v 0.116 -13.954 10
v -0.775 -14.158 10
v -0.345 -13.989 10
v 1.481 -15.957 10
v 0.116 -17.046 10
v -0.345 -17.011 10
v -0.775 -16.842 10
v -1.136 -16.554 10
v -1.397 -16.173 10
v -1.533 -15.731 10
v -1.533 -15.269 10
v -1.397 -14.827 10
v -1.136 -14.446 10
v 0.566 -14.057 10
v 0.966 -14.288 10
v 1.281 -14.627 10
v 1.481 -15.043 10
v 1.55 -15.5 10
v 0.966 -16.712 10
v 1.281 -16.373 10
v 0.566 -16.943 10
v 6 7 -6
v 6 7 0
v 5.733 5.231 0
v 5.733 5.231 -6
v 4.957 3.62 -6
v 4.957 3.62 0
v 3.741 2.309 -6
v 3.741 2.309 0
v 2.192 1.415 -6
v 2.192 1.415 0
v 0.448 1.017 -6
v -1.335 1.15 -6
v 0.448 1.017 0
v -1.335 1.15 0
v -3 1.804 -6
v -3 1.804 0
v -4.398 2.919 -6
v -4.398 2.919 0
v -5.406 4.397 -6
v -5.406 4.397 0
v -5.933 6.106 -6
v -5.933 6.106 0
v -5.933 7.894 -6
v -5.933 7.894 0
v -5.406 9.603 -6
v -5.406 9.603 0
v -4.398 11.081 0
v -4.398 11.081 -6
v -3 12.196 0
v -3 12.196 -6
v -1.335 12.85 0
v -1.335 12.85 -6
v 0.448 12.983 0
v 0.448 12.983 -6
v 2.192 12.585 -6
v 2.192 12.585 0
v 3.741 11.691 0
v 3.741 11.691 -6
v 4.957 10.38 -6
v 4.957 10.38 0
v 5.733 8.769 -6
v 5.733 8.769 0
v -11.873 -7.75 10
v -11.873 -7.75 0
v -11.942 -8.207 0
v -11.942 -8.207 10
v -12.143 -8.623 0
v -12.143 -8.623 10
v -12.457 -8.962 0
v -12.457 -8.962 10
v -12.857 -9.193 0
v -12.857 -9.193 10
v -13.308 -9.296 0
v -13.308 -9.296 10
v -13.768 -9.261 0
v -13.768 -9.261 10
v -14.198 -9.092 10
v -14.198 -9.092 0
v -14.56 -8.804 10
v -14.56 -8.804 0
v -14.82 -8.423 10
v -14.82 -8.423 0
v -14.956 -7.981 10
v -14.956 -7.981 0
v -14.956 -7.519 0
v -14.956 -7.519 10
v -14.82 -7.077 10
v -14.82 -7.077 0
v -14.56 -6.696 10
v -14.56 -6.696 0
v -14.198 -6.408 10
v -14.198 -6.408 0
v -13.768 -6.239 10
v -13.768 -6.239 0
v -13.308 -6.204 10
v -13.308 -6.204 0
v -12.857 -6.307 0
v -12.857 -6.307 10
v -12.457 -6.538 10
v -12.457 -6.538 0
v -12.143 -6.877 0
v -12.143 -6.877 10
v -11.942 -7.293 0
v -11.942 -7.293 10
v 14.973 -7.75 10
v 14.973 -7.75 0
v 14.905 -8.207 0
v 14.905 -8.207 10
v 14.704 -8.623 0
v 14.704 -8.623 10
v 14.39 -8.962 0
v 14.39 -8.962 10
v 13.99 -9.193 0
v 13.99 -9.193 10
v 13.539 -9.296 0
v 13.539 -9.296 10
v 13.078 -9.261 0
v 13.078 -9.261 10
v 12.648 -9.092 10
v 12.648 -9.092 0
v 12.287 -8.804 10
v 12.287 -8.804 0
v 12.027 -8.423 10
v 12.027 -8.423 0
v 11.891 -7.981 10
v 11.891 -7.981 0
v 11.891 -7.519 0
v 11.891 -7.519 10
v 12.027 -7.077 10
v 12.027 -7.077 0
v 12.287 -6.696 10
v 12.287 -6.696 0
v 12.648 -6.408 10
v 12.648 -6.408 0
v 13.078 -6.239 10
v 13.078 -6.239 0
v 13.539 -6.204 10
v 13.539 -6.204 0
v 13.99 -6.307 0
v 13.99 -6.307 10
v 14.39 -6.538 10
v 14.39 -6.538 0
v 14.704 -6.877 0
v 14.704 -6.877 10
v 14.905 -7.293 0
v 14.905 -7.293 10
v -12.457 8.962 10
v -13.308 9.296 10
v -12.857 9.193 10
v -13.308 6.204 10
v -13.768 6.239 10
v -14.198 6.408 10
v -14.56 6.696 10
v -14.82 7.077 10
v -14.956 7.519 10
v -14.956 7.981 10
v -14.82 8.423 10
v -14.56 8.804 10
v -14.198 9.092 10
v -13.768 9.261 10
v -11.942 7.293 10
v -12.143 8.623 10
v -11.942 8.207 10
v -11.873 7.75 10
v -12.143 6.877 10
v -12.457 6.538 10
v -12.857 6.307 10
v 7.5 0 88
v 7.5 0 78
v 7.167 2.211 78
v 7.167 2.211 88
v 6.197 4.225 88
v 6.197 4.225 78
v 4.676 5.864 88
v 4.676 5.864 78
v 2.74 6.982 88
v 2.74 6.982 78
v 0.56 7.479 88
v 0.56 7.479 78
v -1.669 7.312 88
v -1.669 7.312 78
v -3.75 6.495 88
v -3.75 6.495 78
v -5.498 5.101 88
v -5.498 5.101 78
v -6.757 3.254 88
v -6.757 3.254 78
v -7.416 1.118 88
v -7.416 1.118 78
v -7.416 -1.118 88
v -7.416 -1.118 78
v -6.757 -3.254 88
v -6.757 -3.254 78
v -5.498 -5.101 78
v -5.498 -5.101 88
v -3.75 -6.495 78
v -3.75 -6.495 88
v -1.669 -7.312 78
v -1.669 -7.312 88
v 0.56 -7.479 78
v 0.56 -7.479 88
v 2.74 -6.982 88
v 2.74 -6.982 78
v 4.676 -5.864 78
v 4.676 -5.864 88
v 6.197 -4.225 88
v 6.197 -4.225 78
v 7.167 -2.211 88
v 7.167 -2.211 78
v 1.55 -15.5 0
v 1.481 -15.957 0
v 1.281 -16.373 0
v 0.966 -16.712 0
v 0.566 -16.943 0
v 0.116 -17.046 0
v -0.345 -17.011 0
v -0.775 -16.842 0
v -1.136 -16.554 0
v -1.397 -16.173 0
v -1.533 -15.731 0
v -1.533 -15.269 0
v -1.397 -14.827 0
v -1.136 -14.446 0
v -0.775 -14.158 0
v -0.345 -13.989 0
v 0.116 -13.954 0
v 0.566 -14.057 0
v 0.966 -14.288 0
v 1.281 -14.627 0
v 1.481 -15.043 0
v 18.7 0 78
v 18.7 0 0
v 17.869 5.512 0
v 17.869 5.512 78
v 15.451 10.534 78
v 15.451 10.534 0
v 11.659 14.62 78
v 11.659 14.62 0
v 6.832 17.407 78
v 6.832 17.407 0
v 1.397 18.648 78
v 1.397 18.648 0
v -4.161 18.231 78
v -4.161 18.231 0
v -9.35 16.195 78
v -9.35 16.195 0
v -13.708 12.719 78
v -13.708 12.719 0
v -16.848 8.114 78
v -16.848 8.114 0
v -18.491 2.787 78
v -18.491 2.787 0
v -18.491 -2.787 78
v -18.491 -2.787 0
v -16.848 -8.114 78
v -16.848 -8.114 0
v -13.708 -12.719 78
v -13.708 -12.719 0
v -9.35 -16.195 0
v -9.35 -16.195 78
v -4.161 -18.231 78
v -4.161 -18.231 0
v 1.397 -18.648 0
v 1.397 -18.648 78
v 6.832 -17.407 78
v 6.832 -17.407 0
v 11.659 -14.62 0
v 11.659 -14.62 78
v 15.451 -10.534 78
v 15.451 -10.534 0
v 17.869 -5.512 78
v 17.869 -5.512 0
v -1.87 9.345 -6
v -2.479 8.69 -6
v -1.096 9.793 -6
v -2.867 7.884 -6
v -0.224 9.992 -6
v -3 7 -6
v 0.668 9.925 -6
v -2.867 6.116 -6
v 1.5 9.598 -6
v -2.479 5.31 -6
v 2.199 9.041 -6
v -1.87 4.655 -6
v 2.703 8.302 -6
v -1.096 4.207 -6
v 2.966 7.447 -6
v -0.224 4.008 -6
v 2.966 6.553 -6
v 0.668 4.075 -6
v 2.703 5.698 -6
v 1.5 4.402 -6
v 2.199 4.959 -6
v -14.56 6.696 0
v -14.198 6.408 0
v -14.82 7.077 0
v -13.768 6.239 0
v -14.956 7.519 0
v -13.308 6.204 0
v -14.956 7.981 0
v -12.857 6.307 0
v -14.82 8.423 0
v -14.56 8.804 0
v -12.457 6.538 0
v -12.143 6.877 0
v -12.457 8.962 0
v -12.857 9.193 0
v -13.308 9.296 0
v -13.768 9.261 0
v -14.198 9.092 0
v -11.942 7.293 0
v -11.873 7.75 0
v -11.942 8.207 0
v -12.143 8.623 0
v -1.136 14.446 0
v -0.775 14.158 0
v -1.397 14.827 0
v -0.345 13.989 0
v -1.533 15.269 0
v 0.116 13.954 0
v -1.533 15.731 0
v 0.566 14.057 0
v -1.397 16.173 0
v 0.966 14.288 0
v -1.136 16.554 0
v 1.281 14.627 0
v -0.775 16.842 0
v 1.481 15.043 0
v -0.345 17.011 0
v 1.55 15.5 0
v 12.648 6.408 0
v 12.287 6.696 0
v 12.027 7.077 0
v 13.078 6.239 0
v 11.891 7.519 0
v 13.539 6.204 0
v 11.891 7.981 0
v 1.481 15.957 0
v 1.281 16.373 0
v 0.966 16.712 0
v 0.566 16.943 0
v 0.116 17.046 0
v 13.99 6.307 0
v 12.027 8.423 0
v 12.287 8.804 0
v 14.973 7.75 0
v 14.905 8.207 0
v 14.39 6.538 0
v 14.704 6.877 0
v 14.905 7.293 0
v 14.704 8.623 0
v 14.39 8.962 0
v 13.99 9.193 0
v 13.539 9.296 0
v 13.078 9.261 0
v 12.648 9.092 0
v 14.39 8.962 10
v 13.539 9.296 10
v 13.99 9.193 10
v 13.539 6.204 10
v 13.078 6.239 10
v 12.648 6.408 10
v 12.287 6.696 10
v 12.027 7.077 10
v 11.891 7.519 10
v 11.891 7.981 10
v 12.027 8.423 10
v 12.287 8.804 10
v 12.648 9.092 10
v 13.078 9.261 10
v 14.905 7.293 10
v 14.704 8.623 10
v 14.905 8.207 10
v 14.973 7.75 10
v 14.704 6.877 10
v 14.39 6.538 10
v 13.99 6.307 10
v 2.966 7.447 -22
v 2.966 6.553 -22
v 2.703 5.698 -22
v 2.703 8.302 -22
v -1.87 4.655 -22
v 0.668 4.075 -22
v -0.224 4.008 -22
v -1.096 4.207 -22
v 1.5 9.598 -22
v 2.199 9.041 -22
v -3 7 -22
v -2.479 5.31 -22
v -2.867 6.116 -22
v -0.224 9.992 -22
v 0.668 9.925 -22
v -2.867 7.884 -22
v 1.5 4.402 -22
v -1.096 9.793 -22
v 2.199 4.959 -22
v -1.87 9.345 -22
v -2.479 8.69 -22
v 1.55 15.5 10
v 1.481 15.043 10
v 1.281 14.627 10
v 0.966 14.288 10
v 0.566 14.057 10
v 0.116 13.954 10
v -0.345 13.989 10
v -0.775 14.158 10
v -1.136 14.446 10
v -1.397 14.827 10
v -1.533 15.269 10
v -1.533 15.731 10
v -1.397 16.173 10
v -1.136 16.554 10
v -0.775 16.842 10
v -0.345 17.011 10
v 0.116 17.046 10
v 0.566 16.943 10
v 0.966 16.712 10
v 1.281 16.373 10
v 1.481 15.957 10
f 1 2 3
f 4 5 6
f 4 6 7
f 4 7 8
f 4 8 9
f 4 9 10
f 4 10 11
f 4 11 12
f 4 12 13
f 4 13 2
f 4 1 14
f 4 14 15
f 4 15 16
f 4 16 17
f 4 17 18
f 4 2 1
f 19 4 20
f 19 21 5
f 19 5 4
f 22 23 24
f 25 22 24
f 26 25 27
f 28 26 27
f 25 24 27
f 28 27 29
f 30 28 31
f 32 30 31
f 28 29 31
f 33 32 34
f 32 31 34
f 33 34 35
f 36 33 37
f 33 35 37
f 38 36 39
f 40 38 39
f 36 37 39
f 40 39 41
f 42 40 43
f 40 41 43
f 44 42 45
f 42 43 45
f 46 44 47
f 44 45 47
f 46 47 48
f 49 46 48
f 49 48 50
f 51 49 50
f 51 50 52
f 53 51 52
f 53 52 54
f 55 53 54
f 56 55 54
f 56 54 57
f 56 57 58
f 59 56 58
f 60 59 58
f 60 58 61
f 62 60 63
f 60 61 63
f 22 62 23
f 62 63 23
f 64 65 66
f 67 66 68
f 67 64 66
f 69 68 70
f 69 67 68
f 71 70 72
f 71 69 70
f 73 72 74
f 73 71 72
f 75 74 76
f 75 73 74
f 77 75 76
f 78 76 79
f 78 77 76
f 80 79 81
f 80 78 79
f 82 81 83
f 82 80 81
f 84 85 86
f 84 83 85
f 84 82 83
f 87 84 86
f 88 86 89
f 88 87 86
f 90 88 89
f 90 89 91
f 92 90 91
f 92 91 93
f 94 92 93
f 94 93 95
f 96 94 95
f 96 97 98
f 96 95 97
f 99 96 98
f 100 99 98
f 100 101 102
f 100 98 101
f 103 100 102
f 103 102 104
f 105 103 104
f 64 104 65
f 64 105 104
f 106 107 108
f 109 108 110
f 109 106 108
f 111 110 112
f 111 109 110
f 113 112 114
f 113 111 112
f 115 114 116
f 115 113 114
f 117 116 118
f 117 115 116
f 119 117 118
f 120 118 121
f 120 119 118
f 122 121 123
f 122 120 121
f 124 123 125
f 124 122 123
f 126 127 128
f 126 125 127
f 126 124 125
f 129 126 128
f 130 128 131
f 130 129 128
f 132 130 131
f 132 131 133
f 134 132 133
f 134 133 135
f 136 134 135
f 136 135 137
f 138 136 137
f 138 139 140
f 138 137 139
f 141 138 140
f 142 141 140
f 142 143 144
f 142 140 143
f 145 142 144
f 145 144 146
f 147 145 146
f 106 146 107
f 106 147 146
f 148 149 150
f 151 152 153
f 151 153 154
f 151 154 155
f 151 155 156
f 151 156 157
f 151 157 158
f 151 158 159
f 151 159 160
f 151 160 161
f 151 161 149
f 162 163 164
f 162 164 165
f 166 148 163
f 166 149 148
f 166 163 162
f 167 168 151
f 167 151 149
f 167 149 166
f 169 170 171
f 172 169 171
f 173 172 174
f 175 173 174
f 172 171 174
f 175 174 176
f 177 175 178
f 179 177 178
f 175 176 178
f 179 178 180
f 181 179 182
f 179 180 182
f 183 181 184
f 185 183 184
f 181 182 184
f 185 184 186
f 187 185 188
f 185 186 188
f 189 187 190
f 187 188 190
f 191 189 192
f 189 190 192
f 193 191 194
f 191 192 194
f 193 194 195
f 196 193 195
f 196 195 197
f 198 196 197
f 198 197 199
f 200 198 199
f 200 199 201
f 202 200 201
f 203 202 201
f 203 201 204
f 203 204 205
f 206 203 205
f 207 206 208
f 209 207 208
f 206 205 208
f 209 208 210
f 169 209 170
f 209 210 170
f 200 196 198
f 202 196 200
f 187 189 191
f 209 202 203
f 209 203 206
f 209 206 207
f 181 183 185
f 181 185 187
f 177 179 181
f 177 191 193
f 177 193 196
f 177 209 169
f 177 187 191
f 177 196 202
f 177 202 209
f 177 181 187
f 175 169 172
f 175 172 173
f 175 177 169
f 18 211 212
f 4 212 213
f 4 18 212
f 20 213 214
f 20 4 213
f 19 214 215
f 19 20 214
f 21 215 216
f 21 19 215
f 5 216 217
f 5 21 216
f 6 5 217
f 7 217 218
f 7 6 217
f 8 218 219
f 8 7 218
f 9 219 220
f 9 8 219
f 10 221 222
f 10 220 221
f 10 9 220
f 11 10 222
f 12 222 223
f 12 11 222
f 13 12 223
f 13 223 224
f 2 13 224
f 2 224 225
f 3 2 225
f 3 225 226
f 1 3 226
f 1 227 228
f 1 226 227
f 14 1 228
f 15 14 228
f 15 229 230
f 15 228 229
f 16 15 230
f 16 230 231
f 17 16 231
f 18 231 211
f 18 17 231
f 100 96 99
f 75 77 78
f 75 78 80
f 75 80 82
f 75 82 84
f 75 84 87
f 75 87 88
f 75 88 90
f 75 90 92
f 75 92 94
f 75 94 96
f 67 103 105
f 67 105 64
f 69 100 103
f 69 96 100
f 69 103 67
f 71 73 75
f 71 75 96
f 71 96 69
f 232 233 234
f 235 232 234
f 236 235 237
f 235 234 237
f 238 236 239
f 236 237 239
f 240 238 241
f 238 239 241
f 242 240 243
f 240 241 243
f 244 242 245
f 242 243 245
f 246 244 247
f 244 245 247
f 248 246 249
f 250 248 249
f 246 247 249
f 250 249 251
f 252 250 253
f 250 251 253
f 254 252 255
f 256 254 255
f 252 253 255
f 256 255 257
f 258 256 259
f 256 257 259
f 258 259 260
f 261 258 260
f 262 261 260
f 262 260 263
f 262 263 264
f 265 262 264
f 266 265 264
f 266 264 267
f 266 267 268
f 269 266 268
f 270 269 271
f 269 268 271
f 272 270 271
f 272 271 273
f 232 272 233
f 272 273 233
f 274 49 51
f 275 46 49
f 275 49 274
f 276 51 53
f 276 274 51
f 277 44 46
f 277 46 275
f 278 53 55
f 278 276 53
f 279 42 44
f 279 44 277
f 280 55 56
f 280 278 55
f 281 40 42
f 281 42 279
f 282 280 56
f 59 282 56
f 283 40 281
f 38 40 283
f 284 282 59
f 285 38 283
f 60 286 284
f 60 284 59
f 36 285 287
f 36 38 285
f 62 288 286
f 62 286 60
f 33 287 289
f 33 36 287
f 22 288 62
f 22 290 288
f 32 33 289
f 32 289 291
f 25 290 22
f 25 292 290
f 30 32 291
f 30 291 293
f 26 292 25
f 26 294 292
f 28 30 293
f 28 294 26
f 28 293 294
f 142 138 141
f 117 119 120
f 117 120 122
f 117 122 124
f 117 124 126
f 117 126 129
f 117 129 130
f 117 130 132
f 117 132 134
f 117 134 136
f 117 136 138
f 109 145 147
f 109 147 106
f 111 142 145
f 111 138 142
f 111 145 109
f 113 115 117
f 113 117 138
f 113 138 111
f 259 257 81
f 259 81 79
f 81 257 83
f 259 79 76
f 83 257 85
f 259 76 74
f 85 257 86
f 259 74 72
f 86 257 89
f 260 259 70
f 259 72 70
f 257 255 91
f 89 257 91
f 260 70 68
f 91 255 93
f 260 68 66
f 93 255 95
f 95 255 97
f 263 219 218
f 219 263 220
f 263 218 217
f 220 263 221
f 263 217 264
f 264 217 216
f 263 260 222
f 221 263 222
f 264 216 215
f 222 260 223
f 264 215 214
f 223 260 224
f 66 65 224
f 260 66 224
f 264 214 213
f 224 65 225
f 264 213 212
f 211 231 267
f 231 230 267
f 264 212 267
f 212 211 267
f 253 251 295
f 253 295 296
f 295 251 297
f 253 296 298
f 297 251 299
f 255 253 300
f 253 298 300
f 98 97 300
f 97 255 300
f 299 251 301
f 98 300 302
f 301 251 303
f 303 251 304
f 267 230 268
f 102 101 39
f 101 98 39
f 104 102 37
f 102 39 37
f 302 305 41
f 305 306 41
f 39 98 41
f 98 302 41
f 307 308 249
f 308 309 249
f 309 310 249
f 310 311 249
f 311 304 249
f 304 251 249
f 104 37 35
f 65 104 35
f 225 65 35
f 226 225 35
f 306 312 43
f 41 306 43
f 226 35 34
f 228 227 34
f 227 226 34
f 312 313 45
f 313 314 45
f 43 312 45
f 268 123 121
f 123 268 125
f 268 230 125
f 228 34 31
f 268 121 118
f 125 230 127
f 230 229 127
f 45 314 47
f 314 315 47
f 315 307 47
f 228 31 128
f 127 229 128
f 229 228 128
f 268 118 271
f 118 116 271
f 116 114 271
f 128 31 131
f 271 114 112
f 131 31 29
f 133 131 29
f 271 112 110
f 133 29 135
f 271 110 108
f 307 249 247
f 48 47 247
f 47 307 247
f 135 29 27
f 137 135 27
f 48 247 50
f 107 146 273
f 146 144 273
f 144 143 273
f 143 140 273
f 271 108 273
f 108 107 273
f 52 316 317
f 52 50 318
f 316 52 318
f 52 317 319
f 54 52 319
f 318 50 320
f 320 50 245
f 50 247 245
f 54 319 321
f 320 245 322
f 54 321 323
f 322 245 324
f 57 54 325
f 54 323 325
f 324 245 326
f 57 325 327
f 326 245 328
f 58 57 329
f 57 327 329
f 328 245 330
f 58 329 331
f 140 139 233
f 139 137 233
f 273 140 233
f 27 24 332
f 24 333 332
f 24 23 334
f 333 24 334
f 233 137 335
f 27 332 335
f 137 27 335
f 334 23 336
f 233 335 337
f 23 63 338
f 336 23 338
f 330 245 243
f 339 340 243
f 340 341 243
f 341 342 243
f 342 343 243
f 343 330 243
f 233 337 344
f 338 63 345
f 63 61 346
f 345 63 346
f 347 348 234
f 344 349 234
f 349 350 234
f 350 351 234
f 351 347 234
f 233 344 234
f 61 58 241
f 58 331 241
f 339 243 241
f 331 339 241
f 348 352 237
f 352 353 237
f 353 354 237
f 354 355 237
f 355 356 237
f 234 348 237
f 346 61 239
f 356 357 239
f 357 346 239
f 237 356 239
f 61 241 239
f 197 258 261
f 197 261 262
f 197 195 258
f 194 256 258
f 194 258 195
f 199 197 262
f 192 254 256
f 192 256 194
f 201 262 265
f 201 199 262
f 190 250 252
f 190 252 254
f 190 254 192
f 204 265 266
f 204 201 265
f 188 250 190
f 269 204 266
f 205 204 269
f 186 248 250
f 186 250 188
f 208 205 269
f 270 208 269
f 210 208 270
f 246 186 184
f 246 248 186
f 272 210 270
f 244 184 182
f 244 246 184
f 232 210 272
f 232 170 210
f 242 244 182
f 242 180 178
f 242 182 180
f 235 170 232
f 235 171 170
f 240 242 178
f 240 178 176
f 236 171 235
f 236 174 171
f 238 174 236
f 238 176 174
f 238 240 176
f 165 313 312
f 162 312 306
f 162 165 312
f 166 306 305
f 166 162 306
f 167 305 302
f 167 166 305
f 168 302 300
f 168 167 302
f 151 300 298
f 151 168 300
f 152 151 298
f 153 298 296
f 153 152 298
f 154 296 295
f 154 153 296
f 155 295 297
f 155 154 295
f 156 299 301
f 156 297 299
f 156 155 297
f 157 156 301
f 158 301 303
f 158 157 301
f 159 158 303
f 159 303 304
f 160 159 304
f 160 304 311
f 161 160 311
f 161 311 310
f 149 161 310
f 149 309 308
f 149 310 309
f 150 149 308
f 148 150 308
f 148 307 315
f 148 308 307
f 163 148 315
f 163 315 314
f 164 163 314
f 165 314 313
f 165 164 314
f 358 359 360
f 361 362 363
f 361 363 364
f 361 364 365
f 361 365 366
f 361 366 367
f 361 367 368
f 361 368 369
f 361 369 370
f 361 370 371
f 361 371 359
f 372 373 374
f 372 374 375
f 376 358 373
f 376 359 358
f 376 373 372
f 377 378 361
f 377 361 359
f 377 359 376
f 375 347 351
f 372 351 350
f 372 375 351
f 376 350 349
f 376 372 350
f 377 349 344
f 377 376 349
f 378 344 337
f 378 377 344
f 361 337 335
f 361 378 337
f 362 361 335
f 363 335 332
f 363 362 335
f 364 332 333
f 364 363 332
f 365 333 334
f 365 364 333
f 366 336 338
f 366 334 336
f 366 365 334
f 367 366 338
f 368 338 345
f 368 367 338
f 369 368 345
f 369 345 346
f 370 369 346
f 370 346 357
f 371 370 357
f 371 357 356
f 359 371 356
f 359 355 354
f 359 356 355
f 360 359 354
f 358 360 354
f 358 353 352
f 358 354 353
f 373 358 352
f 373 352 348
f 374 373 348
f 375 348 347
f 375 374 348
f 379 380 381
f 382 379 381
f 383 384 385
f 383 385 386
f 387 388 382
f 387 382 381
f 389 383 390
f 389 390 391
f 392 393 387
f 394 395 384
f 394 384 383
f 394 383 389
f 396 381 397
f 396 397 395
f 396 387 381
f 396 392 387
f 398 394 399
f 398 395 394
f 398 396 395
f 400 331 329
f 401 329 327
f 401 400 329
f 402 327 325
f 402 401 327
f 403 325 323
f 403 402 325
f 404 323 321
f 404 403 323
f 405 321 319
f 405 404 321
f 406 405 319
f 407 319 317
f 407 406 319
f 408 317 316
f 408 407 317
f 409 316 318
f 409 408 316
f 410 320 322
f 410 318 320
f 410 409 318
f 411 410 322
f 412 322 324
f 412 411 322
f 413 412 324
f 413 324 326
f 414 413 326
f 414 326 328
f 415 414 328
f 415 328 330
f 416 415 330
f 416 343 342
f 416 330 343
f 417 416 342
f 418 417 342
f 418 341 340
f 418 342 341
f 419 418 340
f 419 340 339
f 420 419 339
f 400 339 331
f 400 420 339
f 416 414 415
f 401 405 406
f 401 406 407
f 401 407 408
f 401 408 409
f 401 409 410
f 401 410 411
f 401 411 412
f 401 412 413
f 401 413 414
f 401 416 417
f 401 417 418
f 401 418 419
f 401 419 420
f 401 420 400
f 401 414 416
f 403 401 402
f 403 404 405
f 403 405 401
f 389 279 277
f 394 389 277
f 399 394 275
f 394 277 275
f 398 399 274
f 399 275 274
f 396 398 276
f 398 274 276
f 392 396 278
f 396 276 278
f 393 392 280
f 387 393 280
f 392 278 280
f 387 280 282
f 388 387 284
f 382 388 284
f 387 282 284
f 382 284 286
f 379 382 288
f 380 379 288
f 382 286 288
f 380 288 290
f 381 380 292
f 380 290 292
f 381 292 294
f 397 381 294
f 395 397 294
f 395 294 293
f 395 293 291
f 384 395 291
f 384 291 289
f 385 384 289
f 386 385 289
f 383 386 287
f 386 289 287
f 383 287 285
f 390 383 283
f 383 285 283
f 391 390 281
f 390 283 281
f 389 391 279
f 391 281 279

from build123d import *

# Parameters (mm, degrees)
SKETCH_1_R               = 18.7
EXTRUDE_1_DEPTH          = 78
SKETCH_2_R               = 7.5
EXTRUDE_2_DEPTH          = 10
CUT_EXTRUDE_1_DEPTH      = 92.887866446
CUT_EXTRUDE_1_DEPTH_BACK = 10
SKETCH_3_R               = 1.55
SKETCH_4_R               = 6
EXTRUDE_3_DEPTH          = 6
SKETCH_5_R               = 3
EXTRUDE_4_DEPTH          = 16


with BuildPart() as part:
    # 草图1 → 凸台-拉伸1 (new body)
    with BuildSketch(Plane.XY):
        Circle(SKETCH_1_R)
    extrude(amount=EXTRUDE_1_DEPTH)

    # 草图2 → 凸台-拉伸2 (add)
    with BuildSketch(Plane.XY.offset(78)):
        Circle(SKETCH_2_R)
    extrude(amount=EXTRUDE_2_DEPTH)

    # 草图3 → 切除-拉伸1 (cut, two sides: drawn at the far end of the back side and taken through both)
    with BuildSketch(Plane(origin=(0, 0, 0), x_dir=(-1, 0, 0), z_dir=(0, 0, -1)).offset(-CUT_EXTRUDE_1_DEPTH_BACK)):
        with Locations(Location((0, 15.5, 0), (0, 0, 180))):
            Circle(SKETCH_3_R)
        with Locations(Location((13.423393759, 7.75, 0), (0, 0, 180))):
            Circle(SKETCH_3_R)
        with Locations(Location((13.423393759, -7.75, 0), (0, 0, 180))):
            Circle(SKETCH_3_R)
        with Locations(Location((0, -15.5, 0), (0, 0, 180))):
            Circle(SKETCH_3_R)
        with Locations(Location((-13.423393759, -7.75, 0), (0, 0, 180))):
            Circle(SKETCH_3_R)
        with Locations(Location((-13.423393759, 7.75, 0), (0, 0, 180))):
            Circle(SKETCH_3_R)
    extrude(amount=CUT_EXTRUDE_1_DEPTH + CUT_EXTRUDE_1_DEPTH_BACK, mode=Mode.SUBTRACT)

    # 草图4 → 凸台-拉伸3 (add)
    with BuildSketch(Plane(origin=(0, 0, 0), x_dir=(-1, 0, 0), z_dir=(0, 0, -1))):
        with Locations(Location((0, 7, 0), (0, 0, 180))):
            Circle(SKETCH_4_R)
    extrude(amount=EXTRUDE_3_DEPTH)

    # 草图5 → 凸台-拉伸4 (add)
    with BuildSketch(Plane(origin=(0, 0, -6), x_dir=(-1, 0, 0), z_dir=(0, 0, -1))):
        with Locations((0, 7)):
            Circle(SKETCH_5_R)
    extrude(amount=EXTRUDE_4_DEPTH)


solid = part.part
